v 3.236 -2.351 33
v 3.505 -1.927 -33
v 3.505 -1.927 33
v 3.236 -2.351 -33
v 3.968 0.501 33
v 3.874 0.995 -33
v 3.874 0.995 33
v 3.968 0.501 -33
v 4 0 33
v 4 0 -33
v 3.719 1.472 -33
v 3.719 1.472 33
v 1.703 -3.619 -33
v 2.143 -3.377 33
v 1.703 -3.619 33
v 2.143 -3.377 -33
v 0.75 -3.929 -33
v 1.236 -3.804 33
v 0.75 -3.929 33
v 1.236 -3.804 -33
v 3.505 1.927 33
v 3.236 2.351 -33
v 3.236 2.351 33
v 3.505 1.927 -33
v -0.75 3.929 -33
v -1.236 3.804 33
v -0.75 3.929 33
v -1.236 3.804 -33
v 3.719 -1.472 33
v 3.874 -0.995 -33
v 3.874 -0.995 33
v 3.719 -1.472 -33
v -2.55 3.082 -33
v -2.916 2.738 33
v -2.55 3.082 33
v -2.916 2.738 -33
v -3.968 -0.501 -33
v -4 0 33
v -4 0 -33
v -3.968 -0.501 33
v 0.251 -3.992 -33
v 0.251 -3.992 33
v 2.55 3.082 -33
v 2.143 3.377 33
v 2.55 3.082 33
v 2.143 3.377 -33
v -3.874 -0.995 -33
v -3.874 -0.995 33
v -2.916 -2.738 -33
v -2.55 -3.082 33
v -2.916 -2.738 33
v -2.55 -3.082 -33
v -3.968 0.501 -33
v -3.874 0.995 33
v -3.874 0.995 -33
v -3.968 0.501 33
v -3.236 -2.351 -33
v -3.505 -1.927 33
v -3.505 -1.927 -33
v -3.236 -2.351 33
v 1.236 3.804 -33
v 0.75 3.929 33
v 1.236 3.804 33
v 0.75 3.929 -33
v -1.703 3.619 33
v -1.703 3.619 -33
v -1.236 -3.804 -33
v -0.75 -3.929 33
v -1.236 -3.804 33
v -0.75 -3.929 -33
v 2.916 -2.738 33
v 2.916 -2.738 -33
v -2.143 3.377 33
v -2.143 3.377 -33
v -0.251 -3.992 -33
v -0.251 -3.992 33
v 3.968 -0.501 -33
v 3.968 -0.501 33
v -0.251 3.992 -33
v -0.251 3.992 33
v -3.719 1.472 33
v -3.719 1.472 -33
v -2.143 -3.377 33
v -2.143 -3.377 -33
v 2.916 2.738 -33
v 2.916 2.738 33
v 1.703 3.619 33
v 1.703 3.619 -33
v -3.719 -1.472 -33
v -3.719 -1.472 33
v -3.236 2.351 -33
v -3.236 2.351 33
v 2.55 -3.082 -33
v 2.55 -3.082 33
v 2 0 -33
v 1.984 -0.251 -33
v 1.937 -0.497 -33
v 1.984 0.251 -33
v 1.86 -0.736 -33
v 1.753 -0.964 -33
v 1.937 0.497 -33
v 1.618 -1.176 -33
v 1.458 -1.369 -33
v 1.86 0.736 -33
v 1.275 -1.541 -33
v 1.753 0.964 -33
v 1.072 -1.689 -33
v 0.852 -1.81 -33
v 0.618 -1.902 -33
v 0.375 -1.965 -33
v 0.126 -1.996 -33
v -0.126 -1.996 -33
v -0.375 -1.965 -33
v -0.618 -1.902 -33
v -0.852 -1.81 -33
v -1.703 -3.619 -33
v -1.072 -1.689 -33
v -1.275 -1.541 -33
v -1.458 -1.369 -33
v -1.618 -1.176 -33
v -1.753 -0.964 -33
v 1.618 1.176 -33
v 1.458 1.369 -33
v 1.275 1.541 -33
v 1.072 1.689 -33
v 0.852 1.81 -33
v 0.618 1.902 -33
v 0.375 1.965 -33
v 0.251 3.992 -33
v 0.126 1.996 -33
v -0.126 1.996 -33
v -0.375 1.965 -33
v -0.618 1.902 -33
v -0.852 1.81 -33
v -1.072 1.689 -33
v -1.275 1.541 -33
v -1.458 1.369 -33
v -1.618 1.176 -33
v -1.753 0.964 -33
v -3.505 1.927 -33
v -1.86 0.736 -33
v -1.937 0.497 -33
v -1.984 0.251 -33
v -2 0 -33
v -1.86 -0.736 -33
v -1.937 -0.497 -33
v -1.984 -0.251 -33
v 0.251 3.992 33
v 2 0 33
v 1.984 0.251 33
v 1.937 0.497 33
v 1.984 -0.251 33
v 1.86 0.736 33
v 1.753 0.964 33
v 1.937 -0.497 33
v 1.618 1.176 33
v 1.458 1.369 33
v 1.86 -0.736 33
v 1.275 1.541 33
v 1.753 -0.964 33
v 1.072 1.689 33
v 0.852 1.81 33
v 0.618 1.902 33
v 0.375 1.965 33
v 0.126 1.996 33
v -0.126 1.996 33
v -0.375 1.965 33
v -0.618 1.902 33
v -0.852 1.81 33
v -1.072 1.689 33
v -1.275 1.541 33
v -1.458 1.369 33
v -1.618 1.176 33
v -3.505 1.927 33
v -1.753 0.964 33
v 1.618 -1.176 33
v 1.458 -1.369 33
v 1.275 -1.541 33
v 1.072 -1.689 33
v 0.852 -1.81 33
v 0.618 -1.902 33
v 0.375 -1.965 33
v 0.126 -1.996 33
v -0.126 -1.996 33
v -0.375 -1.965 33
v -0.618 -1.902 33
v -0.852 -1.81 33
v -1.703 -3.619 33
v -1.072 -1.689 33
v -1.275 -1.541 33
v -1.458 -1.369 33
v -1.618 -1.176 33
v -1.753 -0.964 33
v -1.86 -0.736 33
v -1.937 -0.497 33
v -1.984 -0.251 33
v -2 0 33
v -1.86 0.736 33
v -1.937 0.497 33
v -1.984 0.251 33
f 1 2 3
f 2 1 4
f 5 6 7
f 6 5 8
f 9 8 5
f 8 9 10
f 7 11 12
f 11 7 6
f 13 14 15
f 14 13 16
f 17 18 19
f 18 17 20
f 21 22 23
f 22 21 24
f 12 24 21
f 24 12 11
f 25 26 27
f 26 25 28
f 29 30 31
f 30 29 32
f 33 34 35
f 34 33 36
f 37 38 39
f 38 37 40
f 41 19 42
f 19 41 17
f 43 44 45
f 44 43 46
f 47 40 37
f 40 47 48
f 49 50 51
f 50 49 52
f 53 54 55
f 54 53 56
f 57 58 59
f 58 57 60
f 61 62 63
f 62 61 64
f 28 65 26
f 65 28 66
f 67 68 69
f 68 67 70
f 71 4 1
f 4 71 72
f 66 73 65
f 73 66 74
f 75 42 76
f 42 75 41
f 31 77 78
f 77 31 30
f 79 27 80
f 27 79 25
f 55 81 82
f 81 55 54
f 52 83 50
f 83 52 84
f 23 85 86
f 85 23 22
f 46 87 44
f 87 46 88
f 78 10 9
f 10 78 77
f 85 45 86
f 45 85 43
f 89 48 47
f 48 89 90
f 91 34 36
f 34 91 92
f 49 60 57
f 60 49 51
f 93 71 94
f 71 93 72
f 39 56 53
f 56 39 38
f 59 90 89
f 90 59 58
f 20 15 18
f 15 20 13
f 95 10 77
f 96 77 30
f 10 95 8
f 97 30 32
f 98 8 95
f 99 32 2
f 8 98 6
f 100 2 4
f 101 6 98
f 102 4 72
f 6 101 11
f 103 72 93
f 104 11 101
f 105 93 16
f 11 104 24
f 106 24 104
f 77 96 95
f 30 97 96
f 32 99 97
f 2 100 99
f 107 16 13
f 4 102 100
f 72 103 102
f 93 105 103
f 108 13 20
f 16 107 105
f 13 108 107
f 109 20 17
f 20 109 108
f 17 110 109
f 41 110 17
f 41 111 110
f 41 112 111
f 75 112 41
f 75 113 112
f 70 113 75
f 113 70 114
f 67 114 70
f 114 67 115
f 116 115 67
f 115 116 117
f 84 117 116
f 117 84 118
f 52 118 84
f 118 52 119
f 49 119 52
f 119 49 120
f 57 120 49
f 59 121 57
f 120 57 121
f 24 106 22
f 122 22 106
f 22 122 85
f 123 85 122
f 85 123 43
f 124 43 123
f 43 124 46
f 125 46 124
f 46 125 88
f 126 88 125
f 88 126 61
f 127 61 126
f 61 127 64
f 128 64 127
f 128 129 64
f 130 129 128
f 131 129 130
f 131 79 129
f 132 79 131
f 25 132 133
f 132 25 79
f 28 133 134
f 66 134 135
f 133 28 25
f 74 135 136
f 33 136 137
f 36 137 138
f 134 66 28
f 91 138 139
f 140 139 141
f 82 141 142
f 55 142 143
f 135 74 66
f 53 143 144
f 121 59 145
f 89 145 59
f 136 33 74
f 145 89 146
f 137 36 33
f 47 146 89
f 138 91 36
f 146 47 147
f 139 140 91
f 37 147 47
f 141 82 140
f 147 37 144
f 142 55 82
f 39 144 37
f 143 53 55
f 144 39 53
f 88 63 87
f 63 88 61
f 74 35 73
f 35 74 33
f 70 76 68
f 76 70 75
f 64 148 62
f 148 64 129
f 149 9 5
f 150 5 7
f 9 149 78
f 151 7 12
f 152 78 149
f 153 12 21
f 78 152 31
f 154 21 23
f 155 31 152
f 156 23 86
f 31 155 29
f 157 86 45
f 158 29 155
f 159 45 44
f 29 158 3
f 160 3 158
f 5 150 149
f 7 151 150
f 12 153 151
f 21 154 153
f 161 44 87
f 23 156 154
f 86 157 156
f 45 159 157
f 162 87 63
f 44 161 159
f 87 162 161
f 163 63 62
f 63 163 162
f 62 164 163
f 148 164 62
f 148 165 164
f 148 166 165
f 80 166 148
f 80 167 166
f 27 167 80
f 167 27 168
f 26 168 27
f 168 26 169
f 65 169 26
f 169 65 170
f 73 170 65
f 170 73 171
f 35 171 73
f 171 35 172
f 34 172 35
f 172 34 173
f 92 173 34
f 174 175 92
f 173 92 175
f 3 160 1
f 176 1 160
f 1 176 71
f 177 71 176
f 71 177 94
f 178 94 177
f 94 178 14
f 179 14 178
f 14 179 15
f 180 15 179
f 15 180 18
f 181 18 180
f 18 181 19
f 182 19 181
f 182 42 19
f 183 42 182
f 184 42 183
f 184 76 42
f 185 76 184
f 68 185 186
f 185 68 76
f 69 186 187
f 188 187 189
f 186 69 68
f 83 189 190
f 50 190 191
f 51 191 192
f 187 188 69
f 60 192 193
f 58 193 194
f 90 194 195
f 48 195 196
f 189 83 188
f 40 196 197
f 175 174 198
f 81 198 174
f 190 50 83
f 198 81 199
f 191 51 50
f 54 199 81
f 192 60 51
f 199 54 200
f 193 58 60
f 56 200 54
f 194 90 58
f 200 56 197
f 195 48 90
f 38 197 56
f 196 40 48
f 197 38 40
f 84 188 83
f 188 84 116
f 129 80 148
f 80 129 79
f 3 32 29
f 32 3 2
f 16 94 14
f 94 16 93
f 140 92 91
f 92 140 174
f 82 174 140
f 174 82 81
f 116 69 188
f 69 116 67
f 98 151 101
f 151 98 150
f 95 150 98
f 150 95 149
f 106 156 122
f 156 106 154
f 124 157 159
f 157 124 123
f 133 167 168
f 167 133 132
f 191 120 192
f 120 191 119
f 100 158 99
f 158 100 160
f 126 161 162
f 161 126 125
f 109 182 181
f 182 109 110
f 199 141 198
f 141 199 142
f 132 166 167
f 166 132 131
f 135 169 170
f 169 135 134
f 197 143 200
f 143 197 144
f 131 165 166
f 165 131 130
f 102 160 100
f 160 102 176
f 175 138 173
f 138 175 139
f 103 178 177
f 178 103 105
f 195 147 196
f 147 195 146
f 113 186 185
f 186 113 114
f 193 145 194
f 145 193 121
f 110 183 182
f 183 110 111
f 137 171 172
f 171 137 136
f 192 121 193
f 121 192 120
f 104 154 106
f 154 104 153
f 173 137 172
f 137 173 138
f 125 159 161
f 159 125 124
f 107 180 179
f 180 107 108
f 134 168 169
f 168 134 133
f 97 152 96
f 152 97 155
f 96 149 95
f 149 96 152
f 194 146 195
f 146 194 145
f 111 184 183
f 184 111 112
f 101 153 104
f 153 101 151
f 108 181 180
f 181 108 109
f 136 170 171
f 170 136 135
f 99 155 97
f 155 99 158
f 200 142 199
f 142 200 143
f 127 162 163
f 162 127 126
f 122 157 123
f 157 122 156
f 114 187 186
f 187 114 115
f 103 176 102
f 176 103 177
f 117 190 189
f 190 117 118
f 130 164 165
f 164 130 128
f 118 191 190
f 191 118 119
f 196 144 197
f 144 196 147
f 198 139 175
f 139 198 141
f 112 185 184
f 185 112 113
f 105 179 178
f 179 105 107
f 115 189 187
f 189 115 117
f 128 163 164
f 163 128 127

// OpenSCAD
$fn = 50;


difference() {
	union() {
		translate(v = [0, 0, -33.0000000000]) {
			cylinder(h = 66, r = 4.0000000000);
		}
	}
	union() {
		translate(v = [0, 0, -100.0000000000]) {
			cylinder(h = 200, r = 2.0000000000);
		}
	}
}
